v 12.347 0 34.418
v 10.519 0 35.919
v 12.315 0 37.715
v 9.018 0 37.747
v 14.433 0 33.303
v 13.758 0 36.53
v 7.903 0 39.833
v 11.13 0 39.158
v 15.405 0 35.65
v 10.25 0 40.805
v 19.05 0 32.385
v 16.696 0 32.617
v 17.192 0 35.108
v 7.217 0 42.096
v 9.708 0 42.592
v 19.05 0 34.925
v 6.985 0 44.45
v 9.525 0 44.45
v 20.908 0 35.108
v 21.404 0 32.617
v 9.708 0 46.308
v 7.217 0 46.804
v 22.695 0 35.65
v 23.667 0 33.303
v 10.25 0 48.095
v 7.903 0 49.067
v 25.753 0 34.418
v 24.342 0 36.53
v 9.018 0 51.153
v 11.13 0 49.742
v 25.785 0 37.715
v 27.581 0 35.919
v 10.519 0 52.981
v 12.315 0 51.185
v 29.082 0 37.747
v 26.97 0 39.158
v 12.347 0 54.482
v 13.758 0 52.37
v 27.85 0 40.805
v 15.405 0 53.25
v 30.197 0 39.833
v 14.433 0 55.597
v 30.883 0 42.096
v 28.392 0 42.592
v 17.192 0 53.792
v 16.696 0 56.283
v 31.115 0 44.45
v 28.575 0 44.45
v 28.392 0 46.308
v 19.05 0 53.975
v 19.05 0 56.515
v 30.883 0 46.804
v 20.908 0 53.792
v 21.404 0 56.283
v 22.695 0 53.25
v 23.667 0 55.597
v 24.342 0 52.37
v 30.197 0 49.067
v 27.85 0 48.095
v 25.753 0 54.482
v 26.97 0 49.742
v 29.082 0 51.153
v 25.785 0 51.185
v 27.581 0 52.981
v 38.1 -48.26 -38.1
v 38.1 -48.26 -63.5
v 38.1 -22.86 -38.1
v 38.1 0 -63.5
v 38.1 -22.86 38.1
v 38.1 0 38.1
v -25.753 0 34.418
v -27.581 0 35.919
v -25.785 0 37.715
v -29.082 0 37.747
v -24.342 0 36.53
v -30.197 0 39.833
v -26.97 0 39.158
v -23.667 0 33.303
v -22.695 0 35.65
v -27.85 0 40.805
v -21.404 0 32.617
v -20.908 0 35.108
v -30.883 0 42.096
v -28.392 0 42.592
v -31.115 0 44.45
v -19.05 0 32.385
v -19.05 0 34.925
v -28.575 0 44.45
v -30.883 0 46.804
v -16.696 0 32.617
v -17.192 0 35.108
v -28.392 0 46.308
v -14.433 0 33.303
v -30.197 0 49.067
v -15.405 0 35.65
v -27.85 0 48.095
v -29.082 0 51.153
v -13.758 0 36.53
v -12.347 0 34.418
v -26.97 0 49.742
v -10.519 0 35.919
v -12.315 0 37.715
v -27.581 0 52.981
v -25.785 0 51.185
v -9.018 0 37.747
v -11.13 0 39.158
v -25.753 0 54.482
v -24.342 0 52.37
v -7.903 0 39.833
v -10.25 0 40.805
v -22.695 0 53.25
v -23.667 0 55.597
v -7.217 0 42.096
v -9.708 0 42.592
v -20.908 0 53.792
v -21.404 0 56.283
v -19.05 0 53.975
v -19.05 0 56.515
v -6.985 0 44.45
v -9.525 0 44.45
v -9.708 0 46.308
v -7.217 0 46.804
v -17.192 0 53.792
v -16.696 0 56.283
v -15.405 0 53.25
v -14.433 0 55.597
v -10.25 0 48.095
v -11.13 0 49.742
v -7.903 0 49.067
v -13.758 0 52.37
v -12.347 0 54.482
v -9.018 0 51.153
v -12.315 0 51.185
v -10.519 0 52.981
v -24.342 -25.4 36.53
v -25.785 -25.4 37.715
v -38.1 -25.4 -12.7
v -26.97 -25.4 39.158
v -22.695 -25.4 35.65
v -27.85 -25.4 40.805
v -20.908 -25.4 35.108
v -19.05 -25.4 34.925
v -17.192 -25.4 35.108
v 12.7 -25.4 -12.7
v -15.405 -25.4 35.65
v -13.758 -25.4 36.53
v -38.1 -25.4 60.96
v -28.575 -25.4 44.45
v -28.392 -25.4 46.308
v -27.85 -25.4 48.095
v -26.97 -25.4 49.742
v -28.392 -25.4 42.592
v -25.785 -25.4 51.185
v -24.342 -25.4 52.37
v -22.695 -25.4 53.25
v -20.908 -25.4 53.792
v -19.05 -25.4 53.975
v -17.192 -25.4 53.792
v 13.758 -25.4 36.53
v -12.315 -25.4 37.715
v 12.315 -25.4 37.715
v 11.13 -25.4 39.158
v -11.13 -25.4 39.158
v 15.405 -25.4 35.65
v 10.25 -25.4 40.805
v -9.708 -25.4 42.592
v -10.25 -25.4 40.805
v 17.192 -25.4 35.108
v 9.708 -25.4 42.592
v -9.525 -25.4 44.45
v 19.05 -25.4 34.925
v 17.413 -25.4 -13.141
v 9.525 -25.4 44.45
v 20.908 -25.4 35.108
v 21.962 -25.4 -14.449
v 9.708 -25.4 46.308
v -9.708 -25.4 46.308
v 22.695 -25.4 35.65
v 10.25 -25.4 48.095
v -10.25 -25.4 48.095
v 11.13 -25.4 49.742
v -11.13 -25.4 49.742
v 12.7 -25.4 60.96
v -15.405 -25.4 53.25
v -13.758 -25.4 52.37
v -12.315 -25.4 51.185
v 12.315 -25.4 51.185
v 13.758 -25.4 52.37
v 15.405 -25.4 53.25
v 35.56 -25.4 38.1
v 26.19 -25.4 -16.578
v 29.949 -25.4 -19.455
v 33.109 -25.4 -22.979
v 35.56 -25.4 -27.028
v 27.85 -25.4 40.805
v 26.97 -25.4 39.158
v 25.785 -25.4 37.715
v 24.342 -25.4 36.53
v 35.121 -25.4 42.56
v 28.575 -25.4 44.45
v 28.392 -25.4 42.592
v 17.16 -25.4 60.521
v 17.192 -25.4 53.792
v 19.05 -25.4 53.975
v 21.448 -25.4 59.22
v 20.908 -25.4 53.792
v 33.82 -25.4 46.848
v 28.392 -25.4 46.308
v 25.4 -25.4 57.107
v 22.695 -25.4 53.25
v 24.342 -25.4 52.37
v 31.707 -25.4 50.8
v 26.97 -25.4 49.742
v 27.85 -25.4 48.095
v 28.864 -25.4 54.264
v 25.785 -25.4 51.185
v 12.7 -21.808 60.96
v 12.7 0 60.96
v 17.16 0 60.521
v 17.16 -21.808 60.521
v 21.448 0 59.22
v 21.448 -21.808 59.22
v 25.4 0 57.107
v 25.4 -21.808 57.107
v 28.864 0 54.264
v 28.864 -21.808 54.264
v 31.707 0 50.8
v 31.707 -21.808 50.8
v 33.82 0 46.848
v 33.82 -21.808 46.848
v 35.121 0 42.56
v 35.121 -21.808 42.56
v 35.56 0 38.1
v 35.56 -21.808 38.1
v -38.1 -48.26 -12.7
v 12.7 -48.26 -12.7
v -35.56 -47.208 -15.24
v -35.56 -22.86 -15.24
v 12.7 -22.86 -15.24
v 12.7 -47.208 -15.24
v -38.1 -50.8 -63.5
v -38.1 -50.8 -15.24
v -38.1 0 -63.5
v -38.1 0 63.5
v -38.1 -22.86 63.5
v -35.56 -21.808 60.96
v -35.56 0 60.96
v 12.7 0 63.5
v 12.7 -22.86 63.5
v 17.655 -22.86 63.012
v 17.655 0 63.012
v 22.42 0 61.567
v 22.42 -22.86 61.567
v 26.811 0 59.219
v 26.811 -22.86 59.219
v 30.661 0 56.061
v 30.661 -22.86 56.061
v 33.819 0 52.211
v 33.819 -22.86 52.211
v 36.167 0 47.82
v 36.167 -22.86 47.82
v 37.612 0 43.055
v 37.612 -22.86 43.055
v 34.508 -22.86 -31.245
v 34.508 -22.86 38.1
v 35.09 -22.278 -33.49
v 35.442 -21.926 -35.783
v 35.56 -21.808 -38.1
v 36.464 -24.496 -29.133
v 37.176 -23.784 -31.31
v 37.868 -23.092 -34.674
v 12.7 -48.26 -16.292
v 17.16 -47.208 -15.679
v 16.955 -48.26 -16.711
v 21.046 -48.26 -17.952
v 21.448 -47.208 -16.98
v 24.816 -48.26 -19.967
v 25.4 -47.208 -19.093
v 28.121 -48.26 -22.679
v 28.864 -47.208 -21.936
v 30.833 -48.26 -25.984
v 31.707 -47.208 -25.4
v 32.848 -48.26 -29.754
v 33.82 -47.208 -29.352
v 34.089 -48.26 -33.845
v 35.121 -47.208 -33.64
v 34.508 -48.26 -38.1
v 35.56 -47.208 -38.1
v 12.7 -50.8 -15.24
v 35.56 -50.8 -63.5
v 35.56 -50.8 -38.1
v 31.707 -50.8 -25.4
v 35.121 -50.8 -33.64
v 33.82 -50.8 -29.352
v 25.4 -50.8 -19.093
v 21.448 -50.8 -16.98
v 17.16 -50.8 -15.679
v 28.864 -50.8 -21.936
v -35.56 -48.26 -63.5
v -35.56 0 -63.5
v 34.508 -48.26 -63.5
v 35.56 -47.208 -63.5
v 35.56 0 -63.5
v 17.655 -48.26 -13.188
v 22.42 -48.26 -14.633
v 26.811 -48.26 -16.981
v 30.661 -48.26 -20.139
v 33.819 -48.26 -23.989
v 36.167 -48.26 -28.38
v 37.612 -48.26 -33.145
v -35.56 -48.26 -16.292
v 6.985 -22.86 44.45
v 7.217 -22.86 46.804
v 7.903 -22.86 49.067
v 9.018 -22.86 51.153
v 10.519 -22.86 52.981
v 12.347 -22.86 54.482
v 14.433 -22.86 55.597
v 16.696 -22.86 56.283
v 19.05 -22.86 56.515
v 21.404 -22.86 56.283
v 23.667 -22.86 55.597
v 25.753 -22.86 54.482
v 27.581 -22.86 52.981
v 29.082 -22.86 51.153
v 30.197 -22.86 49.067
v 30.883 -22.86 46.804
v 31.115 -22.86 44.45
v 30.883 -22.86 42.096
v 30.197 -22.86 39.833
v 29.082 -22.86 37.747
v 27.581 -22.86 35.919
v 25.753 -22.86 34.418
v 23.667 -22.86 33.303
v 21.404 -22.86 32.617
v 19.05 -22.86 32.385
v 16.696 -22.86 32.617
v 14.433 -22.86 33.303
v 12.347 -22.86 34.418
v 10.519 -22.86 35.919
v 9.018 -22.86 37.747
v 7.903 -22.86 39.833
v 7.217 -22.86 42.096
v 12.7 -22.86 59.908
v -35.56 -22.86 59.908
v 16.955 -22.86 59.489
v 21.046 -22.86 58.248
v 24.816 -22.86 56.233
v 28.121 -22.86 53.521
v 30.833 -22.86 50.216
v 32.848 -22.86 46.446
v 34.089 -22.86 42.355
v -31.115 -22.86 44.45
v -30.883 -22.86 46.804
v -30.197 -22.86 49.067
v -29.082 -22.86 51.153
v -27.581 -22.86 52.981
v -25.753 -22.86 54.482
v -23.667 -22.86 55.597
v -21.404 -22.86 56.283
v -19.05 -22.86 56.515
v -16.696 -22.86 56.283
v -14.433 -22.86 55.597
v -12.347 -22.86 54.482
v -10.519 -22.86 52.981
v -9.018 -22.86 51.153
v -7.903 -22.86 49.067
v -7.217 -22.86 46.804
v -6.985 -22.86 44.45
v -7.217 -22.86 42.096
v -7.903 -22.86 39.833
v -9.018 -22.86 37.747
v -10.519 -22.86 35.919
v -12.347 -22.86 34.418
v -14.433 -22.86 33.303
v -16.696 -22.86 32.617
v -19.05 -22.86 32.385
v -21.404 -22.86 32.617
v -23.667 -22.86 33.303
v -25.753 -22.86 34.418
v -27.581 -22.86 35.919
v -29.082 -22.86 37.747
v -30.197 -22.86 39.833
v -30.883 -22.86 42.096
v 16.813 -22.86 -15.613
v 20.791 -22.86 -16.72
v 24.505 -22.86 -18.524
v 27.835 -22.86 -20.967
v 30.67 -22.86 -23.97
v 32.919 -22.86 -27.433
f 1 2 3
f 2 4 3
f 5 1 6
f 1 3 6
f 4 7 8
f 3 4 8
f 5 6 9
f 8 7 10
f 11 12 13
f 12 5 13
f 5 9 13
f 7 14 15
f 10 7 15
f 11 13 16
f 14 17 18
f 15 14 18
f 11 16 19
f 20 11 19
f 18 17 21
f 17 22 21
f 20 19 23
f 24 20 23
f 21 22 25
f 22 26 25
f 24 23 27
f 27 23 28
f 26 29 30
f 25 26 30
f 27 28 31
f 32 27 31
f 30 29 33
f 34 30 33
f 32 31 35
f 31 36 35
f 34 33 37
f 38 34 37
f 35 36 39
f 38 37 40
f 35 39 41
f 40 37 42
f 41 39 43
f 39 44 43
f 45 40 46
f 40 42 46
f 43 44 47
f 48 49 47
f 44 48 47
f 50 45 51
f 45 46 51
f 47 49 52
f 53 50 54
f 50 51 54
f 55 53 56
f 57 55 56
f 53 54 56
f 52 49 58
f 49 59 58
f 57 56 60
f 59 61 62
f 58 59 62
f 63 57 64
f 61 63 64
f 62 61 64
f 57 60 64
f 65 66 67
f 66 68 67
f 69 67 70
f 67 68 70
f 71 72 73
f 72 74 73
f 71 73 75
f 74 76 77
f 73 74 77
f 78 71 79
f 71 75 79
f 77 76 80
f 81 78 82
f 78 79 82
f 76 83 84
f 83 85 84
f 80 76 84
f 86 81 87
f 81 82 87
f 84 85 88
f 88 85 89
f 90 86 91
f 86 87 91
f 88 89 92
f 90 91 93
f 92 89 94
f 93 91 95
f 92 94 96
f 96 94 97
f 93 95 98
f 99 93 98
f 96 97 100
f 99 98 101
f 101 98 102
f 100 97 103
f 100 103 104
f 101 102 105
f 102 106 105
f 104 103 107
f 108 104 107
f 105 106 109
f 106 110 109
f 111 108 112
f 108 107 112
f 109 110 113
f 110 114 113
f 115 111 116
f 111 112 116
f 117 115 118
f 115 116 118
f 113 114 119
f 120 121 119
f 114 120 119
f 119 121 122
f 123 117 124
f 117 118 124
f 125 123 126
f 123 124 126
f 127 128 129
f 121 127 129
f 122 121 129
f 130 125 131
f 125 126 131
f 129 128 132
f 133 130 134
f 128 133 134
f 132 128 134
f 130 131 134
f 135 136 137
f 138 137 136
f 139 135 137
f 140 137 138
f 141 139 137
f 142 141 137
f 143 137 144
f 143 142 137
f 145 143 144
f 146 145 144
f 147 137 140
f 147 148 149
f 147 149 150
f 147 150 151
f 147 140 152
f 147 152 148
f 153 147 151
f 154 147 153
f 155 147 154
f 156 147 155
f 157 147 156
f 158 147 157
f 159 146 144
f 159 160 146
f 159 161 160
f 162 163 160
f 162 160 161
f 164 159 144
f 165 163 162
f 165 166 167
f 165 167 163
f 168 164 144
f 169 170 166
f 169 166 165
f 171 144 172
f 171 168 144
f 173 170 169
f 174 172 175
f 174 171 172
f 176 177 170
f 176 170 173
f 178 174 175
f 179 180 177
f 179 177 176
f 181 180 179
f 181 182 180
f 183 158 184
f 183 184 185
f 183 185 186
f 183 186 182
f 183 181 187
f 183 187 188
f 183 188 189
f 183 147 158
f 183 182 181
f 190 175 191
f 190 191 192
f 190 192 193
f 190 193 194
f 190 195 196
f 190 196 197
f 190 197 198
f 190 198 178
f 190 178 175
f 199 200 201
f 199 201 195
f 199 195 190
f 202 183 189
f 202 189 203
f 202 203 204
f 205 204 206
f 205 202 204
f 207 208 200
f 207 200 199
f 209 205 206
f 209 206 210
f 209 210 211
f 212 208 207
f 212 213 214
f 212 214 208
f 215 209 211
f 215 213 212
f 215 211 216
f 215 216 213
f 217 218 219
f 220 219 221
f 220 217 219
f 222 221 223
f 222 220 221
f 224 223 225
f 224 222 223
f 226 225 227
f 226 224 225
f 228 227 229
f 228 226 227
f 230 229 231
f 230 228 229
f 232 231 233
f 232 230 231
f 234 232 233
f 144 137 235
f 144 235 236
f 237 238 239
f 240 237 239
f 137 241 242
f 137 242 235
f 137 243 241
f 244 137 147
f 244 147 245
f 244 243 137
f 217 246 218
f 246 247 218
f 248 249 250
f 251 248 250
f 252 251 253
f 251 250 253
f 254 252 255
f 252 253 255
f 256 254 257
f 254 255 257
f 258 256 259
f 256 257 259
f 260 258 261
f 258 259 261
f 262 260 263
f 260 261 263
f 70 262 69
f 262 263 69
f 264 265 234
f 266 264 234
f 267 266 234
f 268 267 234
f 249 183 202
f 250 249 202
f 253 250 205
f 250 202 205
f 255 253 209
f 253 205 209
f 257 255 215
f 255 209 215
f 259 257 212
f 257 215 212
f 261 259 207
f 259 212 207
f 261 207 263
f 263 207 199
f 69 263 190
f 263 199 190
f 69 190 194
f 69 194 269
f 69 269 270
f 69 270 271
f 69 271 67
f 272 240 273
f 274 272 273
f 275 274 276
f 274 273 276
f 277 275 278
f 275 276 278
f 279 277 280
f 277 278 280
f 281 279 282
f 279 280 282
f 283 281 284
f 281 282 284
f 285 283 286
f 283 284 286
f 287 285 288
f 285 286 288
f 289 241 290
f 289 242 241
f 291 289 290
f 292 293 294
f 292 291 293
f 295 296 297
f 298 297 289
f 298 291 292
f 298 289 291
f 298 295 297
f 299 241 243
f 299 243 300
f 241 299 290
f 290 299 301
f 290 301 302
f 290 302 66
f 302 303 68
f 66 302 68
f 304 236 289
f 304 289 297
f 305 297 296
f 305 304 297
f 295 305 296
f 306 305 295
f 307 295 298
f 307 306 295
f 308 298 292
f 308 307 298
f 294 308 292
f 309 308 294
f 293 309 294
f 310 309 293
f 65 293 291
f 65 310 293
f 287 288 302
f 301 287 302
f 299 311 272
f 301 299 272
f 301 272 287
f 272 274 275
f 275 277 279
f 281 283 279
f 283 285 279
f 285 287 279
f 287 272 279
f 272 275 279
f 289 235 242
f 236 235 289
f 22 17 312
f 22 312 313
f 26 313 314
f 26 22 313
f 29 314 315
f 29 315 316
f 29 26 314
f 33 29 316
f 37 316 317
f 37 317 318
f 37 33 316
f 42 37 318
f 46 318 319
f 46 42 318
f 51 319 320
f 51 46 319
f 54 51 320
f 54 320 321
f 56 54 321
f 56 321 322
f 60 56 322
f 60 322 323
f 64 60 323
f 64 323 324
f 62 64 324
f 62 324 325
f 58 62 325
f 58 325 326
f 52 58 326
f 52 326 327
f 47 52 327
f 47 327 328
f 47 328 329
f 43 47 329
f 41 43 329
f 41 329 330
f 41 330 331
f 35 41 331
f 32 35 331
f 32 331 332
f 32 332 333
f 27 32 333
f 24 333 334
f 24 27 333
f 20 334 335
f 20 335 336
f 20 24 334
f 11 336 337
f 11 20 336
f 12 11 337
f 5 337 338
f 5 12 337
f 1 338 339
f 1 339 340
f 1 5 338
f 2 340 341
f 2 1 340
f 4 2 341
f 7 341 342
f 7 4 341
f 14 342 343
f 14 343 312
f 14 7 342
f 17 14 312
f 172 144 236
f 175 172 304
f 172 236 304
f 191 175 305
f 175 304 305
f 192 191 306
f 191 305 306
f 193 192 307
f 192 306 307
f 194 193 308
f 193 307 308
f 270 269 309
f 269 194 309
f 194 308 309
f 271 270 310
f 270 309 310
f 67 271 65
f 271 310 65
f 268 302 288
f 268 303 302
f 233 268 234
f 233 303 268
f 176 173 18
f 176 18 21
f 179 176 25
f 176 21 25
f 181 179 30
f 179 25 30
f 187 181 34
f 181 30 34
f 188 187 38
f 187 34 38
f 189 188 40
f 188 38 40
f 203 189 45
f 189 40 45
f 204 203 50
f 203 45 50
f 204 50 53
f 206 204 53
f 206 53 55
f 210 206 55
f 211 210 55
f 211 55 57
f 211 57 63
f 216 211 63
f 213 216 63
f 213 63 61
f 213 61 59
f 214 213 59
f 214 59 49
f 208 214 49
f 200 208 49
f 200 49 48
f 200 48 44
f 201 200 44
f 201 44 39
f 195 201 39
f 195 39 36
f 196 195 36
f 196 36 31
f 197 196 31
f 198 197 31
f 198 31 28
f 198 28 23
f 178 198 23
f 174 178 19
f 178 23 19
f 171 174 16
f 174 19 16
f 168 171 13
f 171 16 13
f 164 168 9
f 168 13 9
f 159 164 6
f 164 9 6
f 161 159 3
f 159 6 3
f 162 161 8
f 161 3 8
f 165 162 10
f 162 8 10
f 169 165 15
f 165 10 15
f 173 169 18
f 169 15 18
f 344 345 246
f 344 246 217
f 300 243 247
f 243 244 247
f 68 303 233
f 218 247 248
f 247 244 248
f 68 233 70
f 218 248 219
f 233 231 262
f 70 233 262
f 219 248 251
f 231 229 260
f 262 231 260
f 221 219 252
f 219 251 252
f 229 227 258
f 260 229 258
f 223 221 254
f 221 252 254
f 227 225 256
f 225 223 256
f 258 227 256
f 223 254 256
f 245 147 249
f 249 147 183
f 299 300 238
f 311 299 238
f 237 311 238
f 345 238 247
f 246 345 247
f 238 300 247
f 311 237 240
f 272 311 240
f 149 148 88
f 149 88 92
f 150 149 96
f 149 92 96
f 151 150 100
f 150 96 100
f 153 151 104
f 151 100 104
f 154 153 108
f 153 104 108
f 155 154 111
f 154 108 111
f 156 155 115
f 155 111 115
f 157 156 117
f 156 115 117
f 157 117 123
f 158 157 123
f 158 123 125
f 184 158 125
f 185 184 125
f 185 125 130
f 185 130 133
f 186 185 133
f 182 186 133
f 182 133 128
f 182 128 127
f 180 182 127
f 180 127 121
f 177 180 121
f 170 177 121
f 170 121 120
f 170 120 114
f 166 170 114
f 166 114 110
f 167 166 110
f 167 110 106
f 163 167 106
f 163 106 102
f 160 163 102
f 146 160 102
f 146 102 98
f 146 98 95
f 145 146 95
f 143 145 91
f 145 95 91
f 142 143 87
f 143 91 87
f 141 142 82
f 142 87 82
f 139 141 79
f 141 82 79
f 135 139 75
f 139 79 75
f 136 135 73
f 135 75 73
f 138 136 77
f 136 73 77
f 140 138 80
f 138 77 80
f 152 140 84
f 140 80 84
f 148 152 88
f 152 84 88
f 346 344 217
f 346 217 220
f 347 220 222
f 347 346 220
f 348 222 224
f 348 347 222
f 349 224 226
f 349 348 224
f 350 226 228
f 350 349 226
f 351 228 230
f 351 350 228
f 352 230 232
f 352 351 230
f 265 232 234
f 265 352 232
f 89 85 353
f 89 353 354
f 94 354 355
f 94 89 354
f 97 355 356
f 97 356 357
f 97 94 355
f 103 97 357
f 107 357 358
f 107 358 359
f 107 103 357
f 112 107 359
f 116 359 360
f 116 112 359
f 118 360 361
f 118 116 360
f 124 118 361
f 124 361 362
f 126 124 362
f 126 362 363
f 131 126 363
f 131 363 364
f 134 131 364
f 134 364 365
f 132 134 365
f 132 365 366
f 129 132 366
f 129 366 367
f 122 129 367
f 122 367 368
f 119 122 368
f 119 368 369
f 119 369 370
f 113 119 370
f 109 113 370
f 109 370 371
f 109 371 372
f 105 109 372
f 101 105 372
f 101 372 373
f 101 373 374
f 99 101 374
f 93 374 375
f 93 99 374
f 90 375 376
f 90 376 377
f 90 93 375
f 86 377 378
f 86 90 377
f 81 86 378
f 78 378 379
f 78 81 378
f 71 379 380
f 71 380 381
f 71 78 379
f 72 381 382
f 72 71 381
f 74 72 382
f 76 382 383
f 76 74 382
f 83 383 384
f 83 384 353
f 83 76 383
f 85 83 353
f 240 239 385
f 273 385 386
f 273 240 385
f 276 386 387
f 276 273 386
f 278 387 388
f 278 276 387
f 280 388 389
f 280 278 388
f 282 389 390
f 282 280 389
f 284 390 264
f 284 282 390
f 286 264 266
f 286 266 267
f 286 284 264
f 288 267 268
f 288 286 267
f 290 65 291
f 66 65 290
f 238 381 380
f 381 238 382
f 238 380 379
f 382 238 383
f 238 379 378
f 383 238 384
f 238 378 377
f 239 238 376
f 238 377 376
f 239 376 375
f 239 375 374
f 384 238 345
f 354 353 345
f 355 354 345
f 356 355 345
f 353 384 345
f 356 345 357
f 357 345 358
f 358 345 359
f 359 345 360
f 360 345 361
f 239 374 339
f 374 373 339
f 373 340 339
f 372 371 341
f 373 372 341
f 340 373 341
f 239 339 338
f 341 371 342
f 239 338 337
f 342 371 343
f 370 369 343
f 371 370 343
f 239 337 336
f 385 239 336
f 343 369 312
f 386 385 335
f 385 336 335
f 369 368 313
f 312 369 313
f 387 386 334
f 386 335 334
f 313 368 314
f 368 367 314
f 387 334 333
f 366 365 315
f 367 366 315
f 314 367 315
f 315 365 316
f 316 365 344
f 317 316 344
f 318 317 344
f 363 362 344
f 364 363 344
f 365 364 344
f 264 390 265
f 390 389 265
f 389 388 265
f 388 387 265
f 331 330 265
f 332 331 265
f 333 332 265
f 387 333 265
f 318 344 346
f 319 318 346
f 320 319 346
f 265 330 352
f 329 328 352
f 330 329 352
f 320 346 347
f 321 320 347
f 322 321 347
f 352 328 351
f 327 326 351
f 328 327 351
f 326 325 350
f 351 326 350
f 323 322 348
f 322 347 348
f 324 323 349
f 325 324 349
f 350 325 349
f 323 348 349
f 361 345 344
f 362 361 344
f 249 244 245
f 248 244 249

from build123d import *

# Parameters (mm, degrees)
F0_W     = 76.2
F0_H     = 127
F1_DEPTH = 25.4
F2_W     = 76.2
F2_H     = 50.8
F3_DEPTH = 25.4
F5_D     = 19.05
F6_R     = 25.4
F7_SIZE  = 2.54
F8_T     = -2.54


with BuildPart() as f1:
    # F0 (on Front) → F1 (new body)
    with BuildSketch(Plane.XZ):
        Rectangle(F0_W, F0_H)
    extrude(amount=F1_DEPTH)

    # F2 (on face) → F3 (join)
    with BuildSketch(Plane.XZ.offset(25.4)):
        with Locations((0, -38.1)):
            Rectangle(F2_W, F2_H)
    extrude(amount=F3_DEPTH)

    # F5 (through all)
    with Locations(Plane.XZ.offset(25.4)):
        with Locations((-19.05, 44.45), (19.05, 44.45)):
            Hole(F5_D / 2)

    # F6
    f6_edges = [f1.edges().sort_by_distance(p)[0] for p in [
        (38.1, -12.7, 63.5),
        (38.1, -38.1, -12.7),
    ]]
    fillet(f6_edges, radius=F6_R)

    # F7
    f7_edges = [f1.edges().sort_by_distance(p)[0] for p in [
        (-12.7, -25.4, 63.5),
        (-12.7, -50.8, -12.7),
    ]]
    chamfer(f7_edges, length=F7_SIZE)

    # F8
    f8_openings = [f1.faces().sort_by_distance(p)[0] for p in [
        (-0.03107, -25.379522, -63.5),
        (-0.500566, 0, -3.71782),
    ]]
    offset(amount=F8_T, openings=f8_openings, kind=Kind.INTERSECTION)


solid = f1.part
